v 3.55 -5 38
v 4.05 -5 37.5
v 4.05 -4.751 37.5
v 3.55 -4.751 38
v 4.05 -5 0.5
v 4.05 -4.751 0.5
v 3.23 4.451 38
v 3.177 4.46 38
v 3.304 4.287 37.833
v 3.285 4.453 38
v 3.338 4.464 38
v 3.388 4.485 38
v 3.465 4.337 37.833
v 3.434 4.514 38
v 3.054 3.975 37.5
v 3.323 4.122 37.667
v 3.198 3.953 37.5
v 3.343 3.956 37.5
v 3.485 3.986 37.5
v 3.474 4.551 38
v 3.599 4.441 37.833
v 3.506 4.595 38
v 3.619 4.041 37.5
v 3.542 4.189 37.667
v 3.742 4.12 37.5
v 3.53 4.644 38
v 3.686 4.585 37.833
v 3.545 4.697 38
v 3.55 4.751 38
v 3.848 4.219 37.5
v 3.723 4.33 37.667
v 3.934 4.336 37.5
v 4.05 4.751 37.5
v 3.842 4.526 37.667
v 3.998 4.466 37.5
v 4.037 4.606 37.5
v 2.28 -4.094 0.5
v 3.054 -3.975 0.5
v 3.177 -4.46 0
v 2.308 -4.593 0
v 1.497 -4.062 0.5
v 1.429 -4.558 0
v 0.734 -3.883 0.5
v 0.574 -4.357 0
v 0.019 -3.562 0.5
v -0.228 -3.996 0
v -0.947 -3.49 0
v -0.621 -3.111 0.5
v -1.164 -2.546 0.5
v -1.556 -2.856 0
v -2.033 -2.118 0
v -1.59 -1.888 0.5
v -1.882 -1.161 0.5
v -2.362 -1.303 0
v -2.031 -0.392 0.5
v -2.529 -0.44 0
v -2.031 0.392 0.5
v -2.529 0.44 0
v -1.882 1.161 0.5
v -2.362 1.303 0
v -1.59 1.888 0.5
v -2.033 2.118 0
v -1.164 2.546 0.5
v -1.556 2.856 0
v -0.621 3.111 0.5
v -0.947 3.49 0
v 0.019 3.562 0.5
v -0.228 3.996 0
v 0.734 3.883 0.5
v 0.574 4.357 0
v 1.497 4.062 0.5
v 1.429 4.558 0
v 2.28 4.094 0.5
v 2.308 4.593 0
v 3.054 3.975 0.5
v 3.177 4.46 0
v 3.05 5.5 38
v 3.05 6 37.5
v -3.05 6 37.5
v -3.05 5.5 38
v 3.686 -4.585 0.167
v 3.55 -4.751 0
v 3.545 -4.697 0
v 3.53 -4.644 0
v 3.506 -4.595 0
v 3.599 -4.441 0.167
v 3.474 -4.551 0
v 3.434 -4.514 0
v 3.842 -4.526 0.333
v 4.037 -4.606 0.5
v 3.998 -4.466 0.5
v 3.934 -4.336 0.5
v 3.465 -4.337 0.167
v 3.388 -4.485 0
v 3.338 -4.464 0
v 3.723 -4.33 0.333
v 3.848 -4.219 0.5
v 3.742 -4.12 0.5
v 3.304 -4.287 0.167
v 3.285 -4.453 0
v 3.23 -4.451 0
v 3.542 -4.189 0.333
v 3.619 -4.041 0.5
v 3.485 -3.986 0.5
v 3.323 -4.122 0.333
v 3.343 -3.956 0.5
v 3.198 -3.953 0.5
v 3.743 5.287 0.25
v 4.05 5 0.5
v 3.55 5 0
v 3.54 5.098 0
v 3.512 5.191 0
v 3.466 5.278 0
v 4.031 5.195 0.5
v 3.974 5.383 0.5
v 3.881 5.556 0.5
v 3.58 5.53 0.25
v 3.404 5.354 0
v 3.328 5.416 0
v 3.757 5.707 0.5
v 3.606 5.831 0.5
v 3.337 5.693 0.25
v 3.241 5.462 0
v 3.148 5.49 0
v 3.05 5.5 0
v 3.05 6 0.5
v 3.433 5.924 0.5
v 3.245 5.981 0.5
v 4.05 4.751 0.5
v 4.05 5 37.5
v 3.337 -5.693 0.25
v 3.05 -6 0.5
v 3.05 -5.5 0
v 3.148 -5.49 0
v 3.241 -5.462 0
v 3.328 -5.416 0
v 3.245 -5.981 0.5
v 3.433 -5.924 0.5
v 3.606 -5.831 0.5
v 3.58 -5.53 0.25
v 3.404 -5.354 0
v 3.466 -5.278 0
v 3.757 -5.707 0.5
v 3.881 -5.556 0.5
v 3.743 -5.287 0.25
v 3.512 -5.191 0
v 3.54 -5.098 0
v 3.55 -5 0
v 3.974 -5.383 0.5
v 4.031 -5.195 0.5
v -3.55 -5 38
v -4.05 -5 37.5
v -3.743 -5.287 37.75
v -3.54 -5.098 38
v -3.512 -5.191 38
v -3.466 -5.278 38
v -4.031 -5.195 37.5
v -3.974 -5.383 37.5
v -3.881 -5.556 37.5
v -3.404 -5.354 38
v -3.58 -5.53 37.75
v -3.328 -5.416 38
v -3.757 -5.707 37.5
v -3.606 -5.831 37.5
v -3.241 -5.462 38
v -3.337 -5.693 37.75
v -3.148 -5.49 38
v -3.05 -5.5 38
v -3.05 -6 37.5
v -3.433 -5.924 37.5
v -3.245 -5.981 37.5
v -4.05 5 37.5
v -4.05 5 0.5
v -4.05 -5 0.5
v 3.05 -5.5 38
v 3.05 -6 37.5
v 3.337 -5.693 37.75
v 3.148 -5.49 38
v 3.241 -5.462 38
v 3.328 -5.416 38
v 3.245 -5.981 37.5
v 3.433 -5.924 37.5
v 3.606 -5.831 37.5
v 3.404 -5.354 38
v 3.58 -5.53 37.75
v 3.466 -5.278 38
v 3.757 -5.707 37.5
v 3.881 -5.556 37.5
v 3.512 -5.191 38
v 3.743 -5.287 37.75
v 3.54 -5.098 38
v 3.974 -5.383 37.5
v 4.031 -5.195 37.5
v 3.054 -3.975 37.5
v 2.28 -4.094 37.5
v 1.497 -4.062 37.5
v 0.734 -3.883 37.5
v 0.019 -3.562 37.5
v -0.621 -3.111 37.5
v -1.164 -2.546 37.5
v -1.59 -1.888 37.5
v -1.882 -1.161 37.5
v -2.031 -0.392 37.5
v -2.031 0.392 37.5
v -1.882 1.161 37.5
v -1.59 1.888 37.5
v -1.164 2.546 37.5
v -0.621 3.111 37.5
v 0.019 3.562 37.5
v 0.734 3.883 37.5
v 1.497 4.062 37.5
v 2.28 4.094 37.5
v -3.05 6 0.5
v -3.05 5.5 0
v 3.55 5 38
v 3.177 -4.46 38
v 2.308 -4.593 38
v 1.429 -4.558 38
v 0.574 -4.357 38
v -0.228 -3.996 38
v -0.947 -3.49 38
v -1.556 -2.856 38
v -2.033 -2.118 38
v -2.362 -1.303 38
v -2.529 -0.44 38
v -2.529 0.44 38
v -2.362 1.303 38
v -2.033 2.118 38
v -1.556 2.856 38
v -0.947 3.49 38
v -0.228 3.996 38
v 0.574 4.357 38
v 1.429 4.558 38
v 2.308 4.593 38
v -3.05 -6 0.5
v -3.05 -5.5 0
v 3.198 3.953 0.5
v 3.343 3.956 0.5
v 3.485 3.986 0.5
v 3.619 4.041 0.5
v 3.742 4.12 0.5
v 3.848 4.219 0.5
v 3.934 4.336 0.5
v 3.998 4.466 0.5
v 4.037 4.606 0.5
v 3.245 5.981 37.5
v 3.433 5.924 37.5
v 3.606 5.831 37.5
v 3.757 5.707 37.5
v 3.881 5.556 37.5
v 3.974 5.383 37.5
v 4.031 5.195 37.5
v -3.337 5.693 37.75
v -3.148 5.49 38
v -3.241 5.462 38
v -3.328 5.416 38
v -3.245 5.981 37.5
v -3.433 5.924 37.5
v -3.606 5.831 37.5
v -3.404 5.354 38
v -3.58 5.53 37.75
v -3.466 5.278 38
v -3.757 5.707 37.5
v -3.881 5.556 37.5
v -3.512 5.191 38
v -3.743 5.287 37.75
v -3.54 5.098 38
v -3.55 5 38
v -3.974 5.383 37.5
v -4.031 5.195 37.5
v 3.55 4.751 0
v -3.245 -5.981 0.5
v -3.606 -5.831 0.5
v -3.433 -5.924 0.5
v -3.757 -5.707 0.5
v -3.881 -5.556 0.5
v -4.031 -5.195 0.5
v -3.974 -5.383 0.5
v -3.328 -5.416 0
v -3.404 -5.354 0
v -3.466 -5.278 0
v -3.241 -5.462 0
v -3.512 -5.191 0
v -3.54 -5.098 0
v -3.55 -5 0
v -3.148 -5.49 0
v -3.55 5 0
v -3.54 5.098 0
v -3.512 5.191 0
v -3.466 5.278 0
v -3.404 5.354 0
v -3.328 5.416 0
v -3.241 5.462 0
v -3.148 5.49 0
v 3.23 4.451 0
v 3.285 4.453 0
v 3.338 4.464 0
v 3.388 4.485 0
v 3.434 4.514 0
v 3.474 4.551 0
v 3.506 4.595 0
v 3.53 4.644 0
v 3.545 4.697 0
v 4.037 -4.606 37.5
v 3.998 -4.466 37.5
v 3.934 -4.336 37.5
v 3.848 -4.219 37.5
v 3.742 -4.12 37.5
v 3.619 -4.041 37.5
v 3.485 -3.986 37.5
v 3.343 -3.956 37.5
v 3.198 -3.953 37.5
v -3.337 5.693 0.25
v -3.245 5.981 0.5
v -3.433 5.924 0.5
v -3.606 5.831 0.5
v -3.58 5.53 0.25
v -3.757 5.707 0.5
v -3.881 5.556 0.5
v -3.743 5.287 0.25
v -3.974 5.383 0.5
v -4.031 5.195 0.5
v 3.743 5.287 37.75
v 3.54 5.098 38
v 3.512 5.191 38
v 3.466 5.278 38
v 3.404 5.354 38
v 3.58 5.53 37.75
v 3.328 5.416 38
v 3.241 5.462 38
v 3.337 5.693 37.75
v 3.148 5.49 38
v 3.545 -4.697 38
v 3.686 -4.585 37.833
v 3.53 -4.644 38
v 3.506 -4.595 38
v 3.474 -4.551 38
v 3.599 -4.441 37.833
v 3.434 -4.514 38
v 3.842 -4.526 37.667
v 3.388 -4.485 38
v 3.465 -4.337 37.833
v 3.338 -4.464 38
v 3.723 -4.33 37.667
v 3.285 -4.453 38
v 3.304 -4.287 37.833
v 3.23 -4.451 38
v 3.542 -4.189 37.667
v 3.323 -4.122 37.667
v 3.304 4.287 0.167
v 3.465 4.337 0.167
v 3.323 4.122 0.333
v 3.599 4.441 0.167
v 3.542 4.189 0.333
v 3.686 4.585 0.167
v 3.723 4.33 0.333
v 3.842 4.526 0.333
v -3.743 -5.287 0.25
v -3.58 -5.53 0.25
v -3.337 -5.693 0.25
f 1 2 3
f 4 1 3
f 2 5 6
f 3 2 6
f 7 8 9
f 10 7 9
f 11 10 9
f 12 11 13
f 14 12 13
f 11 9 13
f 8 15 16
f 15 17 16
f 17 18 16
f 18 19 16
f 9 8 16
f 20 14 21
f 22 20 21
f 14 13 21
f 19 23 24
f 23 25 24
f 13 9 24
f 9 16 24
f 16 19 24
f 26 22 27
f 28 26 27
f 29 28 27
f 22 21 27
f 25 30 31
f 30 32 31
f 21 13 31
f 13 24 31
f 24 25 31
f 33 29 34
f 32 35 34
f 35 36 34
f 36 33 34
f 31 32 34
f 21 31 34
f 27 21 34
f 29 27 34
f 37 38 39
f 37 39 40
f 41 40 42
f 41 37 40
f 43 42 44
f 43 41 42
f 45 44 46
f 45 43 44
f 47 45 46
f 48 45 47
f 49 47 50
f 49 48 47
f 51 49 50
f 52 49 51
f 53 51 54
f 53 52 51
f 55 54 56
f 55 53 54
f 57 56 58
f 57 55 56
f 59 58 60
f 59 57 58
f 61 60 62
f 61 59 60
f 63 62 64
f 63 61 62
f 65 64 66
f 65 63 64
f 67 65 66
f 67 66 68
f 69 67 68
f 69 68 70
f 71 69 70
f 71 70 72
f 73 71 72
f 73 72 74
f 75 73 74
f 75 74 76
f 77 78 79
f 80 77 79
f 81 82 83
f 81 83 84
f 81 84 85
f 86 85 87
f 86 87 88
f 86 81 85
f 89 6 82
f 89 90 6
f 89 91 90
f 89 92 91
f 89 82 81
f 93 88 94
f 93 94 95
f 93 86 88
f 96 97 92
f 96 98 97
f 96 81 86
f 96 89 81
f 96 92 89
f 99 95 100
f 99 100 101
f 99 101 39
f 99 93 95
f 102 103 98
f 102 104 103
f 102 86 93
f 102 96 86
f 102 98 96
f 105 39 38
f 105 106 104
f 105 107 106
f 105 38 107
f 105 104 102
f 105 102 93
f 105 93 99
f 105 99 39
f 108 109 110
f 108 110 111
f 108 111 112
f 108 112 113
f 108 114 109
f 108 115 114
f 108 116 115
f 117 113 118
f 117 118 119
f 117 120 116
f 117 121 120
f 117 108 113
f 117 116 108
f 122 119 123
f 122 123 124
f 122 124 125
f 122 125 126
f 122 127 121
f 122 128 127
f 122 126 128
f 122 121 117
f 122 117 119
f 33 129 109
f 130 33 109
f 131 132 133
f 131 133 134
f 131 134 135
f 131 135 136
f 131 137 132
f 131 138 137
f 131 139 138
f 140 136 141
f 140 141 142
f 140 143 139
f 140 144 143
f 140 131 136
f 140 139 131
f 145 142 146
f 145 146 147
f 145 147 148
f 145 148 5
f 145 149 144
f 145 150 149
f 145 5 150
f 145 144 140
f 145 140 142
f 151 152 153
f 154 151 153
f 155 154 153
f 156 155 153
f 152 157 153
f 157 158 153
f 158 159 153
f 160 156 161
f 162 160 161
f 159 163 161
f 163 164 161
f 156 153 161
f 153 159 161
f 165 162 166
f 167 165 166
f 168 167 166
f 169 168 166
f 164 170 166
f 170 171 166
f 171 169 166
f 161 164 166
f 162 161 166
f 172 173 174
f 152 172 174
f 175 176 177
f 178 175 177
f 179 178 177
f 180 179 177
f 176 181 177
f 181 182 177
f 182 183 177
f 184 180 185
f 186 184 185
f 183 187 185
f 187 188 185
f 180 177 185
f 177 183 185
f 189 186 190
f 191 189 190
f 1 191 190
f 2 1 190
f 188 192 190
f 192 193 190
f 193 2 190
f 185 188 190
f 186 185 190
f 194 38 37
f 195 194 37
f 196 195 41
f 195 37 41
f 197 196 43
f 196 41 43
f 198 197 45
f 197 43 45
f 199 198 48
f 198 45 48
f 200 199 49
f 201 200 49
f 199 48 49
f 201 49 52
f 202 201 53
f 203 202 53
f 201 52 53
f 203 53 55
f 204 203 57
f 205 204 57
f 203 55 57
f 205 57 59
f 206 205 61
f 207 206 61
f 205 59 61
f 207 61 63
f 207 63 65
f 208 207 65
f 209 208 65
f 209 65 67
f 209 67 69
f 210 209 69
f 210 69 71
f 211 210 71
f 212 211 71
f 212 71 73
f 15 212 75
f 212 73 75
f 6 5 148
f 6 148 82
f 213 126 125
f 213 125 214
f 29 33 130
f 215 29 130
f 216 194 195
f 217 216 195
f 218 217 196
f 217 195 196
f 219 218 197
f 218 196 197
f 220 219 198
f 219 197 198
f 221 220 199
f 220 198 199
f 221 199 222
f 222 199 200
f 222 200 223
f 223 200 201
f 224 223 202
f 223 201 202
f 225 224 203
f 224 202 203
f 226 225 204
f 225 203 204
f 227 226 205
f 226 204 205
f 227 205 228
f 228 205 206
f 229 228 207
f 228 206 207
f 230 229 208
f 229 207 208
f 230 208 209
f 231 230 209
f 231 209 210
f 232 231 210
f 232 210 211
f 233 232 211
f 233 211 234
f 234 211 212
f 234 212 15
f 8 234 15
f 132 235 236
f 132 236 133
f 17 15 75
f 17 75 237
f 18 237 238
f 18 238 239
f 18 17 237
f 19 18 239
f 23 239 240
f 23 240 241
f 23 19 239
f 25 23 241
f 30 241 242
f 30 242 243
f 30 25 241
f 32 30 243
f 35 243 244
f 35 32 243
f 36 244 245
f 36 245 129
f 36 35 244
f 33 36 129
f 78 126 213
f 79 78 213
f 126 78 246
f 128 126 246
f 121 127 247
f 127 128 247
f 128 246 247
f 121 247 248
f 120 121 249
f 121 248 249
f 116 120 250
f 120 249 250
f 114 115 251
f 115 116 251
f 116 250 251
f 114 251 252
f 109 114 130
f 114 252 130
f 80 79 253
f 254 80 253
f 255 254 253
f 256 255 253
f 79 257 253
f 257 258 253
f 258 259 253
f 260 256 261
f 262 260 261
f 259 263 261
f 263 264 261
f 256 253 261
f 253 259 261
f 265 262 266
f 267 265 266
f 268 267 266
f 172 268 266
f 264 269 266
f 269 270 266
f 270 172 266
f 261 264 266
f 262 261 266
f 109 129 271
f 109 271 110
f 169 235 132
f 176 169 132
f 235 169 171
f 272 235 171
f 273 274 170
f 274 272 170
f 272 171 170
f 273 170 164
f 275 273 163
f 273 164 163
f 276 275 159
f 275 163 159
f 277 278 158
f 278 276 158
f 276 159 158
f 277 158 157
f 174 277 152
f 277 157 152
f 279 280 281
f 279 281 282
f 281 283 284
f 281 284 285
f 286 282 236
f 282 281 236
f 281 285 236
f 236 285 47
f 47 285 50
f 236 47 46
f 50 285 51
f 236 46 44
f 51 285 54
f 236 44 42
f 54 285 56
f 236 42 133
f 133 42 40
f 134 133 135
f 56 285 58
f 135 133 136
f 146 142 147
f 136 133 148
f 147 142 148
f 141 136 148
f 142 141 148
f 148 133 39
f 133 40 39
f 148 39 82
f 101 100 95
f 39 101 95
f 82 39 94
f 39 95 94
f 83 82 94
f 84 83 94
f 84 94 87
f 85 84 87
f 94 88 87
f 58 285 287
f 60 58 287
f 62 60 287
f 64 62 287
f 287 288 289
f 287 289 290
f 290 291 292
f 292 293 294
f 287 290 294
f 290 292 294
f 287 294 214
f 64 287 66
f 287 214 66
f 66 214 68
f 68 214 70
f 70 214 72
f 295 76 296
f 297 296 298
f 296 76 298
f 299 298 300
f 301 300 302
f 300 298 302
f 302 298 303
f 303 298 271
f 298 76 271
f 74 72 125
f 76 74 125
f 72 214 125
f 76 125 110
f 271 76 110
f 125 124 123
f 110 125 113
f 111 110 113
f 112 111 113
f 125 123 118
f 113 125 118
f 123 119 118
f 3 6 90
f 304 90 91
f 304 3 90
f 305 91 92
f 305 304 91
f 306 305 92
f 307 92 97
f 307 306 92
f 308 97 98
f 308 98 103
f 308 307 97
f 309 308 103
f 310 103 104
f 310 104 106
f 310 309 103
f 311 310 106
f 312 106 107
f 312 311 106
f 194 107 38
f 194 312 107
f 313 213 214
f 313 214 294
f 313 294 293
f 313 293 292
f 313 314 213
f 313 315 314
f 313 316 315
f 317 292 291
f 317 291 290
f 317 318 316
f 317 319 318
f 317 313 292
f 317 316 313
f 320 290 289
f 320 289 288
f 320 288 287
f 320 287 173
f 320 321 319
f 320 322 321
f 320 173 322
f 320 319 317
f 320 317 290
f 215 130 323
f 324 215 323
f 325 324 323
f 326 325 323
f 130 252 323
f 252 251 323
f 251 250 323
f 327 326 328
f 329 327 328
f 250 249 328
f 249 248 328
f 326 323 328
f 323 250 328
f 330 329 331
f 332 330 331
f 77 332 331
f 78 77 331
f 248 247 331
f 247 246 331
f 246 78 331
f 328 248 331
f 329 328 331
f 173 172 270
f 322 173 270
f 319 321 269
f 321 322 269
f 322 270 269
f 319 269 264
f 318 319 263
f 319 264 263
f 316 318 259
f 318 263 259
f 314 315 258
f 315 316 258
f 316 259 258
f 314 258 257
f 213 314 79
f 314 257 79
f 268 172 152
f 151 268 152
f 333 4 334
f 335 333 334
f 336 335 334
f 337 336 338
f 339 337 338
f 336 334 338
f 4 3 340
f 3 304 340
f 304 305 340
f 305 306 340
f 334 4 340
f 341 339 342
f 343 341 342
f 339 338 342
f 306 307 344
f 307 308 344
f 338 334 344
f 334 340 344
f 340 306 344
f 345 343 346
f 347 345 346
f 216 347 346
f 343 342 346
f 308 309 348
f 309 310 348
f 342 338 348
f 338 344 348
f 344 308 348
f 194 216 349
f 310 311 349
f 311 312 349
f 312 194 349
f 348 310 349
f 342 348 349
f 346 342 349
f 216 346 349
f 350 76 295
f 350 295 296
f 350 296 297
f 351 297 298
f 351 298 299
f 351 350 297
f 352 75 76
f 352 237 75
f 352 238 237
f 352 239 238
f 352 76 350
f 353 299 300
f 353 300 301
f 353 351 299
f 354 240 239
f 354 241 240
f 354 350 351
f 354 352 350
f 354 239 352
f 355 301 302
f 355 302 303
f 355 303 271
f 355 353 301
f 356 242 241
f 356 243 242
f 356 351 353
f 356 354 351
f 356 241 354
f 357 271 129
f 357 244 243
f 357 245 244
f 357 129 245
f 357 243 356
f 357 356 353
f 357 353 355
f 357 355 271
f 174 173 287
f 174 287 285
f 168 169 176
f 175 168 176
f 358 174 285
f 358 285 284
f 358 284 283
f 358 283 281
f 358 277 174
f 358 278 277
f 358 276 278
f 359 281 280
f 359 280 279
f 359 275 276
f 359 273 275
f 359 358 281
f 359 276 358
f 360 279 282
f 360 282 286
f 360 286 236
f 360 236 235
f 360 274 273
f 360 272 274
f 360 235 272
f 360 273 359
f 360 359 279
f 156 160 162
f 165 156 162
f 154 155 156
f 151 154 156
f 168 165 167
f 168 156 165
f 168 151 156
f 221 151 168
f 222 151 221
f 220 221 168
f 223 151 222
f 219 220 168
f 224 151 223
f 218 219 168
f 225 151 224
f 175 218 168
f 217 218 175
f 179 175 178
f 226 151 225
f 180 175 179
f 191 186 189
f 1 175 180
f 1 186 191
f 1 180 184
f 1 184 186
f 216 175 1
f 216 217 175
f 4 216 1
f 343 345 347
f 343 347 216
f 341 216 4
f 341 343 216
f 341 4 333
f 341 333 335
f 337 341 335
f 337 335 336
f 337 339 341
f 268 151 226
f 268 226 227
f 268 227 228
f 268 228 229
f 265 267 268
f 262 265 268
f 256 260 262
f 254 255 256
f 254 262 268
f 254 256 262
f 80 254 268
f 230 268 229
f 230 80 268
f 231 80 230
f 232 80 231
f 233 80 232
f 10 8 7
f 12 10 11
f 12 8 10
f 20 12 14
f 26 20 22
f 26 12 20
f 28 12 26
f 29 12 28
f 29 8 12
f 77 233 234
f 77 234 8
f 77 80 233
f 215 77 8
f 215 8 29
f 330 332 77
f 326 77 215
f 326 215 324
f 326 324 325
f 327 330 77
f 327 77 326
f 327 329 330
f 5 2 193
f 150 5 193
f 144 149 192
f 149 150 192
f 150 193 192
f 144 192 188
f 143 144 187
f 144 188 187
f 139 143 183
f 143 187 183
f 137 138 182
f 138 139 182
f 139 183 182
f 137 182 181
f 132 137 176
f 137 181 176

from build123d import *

# Parameters (mm, degrees)
F1_DEPTH = 38
F2_R     = 0.8
F3_R     = 1
F4_SIZE  = 0.5


with BuildPart() as f1:
    # F0 (on Top) → F1 (new body)
    with BuildSketch(Plane.XY):
        with BuildLine():
            Line((-4.05, -6), (4.05, -6))
            Line((4.05, -6), (4.05, -3.579106))
            ThreePointArc((4.05, -3.579106), (-2.05, 0), (4.05, 3.579106))
            Line((4.05, 3.579106), (4.05, 6))
            Line((4.05, 6), (-4.05, 6))
            Line((-4.05, 6), (-4.05, -6))
        make_face()
    extrude(amount=F1_DEPTH)

    # F2
    f2_edges = [f1.edges().sort_by_distance(p)[0] for p in [
        (4.05, 3.579106, 19),
        (4.05, -3.579106, 19),
    ]]
    fillet(f2_edges, radius=F2_R)

    # F3
    f3_edges = [f1.edges().sort_by_distance(p)[0] for p in [
        (4.05, 6, 19),
        (4.05, -6, 19),
        (-4.05, -6, 19),
        (-4.05, 6, 19),
    ]]
    fillet(f3_edges, radius=F3_R)

    # F4
    f4_edges = [f1.edges().sort_by_distance(p)[0] for p in [
        (-2.05, 0, 38),
        (-2.05, 0, 0),
    ]]
    chamfer(f4_edges, length=F4_SIZE)


solid = f1.part
